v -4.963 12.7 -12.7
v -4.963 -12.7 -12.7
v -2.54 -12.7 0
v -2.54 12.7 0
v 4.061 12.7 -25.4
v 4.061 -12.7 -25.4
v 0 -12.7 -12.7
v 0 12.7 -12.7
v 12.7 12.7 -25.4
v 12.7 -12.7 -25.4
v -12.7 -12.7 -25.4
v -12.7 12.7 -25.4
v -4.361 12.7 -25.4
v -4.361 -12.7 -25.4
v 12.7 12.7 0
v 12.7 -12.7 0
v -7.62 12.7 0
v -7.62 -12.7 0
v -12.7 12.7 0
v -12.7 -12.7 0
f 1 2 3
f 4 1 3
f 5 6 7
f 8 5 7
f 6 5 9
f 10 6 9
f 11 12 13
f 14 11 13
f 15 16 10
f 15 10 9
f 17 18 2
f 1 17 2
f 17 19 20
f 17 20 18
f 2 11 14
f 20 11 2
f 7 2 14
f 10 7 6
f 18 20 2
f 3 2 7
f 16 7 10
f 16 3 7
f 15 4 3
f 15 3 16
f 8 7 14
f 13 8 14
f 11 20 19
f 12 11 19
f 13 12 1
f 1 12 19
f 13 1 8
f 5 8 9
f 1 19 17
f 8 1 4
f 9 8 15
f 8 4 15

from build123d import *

# Parameters (mm, degrees)
F0_W     = 25.4
F0_H     = 25.4
F1_DEPTH = 25.4
F3_DEPTH = 25.4
F5_DEPTH = 25.4


with BuildPart() as f1:
    # F0 (on Top) → F1 (new body)
    with BuildSketch(Plane.XY):
        Rectangle(F0_W, F0_H)
    extrude(amount=-F1_DEPTH)

    # F2 (on face) → F3 (cut)
    with BuildSketch(Plane.XZ.offset(12.7)):
        Polygon((0, -12.7), (-4.361447, -25.4), (4.060659, -25.4), align=None)
    extrude(amount=-F3_DEPTH, mode=Mode.SUBTRACT)

    # F4 (on face) → F5 (cut)
    with BuildSketch(Plane.XZ.offset(12.7)):
        Polygon((-2.54, 0), (-7.62, 0), (-4.963026, -12.7), align=None)
    extrude(amount=-F5_DEPTH, mode=Mode.SUBTRACT)


solid = f1.part
